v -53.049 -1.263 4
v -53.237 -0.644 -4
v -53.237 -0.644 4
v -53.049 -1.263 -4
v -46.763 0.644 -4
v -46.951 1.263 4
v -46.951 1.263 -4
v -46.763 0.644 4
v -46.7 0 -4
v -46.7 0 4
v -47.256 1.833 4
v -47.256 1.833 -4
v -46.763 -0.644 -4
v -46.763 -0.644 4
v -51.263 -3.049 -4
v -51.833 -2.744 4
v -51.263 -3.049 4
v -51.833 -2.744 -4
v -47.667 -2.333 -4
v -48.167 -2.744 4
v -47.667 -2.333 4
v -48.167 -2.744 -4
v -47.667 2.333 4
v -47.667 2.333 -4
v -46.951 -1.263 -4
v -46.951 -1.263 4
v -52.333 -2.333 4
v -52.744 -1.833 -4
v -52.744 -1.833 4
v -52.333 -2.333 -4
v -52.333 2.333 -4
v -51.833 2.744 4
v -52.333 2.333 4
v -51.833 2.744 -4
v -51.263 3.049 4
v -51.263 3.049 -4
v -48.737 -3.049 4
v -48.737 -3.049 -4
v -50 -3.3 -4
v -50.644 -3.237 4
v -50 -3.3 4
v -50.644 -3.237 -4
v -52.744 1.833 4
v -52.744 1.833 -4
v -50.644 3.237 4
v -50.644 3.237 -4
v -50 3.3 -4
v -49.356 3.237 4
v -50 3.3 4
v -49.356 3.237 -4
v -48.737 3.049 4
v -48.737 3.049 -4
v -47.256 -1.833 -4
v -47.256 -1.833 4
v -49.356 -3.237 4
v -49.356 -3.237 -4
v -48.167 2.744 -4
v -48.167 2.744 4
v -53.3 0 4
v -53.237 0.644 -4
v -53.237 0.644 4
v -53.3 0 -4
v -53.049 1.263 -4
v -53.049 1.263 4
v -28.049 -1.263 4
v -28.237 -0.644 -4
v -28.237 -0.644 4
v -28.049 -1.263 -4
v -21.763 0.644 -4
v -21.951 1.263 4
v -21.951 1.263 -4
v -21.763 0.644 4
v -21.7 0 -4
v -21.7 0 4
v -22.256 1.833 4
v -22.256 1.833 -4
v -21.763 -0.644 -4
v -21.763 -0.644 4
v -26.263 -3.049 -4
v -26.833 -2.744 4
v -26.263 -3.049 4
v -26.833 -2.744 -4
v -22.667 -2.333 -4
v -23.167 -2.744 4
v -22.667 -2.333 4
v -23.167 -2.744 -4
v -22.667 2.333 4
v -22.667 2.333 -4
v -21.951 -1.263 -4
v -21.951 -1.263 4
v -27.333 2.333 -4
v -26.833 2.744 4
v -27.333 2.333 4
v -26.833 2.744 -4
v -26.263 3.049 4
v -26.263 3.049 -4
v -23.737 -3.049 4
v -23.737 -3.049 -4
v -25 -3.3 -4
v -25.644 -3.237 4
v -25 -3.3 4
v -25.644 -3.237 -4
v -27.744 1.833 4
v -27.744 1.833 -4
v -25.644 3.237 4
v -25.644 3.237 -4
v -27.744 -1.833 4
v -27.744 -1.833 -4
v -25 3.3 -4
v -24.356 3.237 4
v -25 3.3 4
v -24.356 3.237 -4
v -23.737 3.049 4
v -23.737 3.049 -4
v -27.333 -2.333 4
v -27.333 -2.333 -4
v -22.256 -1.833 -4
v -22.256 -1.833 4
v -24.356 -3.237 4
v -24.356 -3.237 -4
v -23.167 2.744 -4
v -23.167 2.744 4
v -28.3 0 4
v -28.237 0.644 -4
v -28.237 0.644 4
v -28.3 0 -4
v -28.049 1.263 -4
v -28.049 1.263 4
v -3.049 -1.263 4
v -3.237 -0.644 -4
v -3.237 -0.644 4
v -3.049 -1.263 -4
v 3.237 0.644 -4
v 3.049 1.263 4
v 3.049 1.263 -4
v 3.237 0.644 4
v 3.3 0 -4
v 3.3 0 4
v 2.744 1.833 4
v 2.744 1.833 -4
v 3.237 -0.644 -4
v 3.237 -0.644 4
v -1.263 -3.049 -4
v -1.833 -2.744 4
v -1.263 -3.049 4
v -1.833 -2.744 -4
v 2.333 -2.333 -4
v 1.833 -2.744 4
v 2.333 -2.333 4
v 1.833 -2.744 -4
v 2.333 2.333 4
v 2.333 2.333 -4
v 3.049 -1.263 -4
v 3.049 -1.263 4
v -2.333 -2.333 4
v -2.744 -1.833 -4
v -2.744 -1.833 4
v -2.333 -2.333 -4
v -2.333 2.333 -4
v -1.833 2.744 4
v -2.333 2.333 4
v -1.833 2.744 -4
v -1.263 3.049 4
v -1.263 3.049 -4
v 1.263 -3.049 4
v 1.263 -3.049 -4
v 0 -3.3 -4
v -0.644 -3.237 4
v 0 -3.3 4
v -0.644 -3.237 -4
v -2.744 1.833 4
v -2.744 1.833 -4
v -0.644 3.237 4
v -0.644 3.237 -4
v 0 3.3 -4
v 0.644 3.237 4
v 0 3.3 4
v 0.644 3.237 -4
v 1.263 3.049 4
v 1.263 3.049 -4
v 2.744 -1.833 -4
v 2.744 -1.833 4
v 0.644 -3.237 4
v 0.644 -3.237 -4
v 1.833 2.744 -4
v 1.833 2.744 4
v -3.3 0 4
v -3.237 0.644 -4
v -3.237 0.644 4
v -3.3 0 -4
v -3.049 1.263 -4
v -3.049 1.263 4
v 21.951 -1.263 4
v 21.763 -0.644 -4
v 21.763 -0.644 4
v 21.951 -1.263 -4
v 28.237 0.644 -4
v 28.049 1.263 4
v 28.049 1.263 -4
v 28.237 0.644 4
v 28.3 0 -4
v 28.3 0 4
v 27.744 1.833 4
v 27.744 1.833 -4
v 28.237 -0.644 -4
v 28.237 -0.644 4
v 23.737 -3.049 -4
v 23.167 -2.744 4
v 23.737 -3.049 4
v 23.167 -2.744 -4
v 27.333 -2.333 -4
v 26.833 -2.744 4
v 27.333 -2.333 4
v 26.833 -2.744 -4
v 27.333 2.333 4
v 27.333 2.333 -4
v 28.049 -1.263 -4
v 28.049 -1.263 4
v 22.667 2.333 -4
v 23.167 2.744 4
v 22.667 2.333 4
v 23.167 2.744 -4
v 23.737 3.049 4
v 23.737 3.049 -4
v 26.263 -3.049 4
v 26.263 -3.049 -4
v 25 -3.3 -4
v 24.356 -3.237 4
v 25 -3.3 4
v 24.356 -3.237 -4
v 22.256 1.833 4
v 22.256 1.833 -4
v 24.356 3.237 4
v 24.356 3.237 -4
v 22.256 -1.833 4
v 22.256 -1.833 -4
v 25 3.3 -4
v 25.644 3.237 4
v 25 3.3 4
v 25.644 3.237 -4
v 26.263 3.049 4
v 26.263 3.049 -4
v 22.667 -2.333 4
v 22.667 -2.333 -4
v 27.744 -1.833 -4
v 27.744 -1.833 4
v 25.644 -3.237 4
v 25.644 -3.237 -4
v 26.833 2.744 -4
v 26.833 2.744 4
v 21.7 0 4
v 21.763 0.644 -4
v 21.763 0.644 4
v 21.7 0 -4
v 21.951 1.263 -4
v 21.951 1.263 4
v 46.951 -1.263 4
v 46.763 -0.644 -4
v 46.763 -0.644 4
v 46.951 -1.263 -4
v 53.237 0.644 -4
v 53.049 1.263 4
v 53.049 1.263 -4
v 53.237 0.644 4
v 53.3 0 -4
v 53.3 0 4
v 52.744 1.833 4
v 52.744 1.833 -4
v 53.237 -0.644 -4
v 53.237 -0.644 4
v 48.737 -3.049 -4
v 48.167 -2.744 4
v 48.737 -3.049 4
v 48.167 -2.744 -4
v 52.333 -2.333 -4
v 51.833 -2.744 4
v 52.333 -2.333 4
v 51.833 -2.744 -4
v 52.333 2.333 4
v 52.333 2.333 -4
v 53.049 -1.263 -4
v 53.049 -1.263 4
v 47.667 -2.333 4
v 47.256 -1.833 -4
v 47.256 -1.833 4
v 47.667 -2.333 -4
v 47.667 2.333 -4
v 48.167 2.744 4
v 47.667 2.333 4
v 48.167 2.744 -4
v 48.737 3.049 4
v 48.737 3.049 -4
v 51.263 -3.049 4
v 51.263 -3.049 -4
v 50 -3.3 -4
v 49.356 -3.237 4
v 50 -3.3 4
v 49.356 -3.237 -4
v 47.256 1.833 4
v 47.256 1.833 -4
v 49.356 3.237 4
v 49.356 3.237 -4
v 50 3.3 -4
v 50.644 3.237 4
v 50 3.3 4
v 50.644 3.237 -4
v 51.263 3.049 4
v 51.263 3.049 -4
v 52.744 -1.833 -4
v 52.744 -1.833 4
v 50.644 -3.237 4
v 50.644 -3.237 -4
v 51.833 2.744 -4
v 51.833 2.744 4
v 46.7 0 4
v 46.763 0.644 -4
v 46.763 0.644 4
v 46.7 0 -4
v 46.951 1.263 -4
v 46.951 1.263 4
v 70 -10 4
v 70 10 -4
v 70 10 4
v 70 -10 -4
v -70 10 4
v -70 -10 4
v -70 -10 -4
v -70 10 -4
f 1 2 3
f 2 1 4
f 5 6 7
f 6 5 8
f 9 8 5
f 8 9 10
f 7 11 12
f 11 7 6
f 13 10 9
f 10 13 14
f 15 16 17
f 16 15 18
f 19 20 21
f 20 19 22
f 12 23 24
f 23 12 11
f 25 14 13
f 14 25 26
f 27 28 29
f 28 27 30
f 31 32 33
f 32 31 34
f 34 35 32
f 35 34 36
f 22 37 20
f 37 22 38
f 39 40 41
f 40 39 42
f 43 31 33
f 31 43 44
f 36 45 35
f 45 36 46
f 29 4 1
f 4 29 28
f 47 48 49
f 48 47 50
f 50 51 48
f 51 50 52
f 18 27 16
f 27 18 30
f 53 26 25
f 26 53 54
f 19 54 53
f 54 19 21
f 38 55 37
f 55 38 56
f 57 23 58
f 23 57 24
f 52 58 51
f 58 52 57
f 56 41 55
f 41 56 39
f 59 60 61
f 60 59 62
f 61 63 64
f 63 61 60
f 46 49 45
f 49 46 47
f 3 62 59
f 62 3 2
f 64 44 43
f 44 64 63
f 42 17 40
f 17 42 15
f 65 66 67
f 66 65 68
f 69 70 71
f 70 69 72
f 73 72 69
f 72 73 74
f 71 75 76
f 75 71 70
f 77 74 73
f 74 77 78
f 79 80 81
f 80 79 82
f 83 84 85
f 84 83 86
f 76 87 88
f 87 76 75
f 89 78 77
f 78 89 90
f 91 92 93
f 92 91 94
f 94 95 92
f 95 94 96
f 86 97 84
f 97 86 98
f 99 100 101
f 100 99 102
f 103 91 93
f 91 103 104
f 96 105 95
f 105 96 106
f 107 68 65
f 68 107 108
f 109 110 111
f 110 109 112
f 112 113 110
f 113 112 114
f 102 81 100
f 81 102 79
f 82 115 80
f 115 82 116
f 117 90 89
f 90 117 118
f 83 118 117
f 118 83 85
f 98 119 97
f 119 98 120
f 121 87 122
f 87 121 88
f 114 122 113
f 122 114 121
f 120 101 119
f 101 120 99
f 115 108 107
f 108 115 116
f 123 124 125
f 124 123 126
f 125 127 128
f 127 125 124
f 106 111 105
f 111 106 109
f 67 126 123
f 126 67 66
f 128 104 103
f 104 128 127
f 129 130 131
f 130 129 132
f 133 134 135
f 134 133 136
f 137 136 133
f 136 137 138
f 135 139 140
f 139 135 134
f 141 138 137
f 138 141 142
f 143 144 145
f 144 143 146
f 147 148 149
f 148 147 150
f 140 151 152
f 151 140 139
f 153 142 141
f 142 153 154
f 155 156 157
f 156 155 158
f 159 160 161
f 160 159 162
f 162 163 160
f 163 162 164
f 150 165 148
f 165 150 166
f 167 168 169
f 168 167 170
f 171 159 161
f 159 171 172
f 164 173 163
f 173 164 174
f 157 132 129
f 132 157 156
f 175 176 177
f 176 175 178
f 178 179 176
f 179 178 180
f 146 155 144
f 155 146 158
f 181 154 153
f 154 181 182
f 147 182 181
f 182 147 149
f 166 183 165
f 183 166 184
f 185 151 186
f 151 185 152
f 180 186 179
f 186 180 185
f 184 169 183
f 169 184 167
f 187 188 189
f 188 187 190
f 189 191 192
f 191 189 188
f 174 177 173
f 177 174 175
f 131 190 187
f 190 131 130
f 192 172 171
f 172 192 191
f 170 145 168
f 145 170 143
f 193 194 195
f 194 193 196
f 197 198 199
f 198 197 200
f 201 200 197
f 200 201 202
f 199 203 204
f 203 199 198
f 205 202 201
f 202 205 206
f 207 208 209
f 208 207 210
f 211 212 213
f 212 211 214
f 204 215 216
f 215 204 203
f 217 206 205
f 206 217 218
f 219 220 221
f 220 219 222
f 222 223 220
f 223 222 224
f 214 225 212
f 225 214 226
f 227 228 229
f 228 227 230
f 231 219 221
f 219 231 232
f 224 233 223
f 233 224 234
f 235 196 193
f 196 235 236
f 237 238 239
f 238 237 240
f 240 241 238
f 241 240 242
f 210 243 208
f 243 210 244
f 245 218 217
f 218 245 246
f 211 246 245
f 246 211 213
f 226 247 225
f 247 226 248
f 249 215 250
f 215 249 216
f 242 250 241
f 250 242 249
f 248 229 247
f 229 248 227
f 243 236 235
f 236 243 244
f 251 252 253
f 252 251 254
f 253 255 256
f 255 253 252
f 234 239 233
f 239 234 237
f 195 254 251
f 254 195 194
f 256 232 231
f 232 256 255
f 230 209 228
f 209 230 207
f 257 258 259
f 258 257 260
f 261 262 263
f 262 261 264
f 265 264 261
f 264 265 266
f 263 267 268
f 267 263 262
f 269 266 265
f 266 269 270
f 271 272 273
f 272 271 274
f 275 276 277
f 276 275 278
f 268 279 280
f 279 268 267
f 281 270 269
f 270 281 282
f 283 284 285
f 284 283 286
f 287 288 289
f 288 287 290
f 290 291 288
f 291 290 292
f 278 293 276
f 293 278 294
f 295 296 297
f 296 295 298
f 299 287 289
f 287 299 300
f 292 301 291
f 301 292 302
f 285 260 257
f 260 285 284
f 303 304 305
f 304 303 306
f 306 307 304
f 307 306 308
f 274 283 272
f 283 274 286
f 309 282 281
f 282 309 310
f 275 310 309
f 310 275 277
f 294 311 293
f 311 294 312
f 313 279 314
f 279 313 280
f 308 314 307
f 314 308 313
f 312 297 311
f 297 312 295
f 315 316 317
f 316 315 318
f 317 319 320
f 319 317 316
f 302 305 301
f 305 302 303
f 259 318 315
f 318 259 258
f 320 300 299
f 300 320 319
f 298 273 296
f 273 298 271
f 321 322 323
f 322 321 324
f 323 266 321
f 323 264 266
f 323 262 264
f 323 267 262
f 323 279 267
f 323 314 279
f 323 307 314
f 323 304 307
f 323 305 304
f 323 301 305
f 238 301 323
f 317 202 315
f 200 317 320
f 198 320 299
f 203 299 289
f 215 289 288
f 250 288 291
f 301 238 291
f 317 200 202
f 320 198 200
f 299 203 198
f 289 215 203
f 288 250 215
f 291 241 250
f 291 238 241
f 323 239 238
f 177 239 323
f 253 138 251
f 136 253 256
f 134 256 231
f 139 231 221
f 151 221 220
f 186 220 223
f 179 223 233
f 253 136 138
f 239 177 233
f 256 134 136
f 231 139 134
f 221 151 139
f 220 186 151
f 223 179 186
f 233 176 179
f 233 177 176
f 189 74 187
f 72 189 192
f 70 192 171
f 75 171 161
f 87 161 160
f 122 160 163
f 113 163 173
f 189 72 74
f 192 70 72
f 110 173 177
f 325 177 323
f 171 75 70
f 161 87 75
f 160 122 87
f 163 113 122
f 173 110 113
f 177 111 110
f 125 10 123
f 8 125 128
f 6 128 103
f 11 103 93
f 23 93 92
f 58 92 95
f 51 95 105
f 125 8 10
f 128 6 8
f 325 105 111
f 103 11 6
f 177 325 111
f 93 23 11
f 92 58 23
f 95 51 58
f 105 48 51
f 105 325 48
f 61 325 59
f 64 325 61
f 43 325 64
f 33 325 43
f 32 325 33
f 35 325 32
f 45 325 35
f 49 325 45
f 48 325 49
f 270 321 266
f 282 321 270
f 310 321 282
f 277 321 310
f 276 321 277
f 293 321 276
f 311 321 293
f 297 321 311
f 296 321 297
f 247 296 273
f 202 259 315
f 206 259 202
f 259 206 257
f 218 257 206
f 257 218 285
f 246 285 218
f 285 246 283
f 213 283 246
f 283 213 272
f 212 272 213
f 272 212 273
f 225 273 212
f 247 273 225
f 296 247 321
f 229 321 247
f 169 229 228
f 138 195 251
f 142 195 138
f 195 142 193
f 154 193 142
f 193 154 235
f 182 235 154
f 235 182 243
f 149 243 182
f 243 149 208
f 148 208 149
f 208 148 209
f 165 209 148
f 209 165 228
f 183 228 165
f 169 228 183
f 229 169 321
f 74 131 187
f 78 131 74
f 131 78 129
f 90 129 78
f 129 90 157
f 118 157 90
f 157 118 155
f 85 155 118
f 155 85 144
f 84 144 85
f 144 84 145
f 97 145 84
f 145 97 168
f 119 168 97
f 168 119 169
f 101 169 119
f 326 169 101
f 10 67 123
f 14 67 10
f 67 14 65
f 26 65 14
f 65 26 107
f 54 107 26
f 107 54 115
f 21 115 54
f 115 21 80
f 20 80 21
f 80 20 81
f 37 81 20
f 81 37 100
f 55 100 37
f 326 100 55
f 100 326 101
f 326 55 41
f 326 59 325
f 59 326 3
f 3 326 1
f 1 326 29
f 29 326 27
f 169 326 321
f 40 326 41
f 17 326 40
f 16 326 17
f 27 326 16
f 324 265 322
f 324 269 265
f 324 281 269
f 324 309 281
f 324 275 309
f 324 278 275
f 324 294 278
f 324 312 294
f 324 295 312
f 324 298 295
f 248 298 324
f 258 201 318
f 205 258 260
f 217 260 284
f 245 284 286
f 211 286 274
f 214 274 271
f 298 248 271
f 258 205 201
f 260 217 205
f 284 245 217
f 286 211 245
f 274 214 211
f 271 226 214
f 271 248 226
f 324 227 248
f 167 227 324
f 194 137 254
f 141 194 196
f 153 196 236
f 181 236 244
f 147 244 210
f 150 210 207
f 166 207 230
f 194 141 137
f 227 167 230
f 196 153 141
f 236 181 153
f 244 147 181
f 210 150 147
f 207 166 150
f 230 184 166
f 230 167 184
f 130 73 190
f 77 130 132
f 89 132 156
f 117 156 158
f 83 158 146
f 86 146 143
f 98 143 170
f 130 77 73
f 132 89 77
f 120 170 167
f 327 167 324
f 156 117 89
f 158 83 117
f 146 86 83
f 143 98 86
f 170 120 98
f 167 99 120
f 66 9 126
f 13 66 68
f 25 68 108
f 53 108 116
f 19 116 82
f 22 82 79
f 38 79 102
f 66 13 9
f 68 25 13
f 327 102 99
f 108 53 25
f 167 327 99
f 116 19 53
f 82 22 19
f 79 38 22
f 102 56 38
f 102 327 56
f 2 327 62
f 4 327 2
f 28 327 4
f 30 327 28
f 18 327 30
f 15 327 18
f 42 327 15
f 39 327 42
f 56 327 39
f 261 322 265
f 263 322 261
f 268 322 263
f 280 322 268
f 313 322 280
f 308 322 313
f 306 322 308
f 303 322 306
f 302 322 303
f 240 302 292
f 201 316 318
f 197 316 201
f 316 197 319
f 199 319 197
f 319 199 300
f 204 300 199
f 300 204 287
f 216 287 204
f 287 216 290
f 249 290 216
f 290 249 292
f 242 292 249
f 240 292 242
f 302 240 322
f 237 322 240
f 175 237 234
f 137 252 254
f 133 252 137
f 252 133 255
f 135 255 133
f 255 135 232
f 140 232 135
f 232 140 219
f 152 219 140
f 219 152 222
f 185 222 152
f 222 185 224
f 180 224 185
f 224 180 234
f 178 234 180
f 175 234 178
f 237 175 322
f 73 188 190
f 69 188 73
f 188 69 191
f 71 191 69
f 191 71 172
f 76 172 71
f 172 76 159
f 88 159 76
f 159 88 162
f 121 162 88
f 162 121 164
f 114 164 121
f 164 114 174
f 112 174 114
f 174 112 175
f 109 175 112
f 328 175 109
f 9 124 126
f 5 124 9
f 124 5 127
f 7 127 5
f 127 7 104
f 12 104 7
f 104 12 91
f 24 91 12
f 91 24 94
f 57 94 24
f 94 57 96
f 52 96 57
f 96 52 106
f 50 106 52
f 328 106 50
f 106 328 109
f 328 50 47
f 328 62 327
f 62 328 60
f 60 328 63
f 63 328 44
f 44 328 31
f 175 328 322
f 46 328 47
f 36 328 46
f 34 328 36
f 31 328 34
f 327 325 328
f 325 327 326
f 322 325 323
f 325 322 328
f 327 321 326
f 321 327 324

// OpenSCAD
$fn = 32;

// ----------------------------------------------------------------------
// Hole bar, 5 x Ø6.6
// skip layout, 20 mm edge offset
// ----------------------------------------------------------------------

// --- parameters (mm) ---
bar_w = 20;         // bar width (Y)
bar_t = 8;          // bar thickness (Z)
holes = 5;          // holes per row
hole_d = 6.6;       // hole diameter
edge = 20;          // offset from the bar end to the first hole
grid_pitch = 12.5;  // grid the bar was laid out on

// --- derived feature positions (mm) ---
pitch = grid_pitch * 2;       // = 25   holes sit every other grid slot
span = (holes - 1) * pitch;   // = 100   distance between the end holes
bar_l = span + 2 * edge;      // = 140   overall bar length
start_x = -bar_l / 2 + edge;  // = -50   X of the first hole
feature_centers = [
  [start_x + 0 * pitch, 0],
  [start_x + 1 * pitch, 0],
  [start_x + 2 * pitch, 0],
  [start_x + 3 * pitch, 0],
  [start_x + 4 * pitch, 0]
];   // hole centres of the first row

// bar with one row of holes, drilled from feature_centers
difference() {
  translate([-bar_l / 2, -bar_w / 2, -bar_t / 2]) cube([bar_l, bar_w, bar_t]);
  for (centre = feature_centers)
    translate([centre[0], centre[1], 0])
      cylinder(d = hole_d, h = bar_t + 2, center = true);
}
